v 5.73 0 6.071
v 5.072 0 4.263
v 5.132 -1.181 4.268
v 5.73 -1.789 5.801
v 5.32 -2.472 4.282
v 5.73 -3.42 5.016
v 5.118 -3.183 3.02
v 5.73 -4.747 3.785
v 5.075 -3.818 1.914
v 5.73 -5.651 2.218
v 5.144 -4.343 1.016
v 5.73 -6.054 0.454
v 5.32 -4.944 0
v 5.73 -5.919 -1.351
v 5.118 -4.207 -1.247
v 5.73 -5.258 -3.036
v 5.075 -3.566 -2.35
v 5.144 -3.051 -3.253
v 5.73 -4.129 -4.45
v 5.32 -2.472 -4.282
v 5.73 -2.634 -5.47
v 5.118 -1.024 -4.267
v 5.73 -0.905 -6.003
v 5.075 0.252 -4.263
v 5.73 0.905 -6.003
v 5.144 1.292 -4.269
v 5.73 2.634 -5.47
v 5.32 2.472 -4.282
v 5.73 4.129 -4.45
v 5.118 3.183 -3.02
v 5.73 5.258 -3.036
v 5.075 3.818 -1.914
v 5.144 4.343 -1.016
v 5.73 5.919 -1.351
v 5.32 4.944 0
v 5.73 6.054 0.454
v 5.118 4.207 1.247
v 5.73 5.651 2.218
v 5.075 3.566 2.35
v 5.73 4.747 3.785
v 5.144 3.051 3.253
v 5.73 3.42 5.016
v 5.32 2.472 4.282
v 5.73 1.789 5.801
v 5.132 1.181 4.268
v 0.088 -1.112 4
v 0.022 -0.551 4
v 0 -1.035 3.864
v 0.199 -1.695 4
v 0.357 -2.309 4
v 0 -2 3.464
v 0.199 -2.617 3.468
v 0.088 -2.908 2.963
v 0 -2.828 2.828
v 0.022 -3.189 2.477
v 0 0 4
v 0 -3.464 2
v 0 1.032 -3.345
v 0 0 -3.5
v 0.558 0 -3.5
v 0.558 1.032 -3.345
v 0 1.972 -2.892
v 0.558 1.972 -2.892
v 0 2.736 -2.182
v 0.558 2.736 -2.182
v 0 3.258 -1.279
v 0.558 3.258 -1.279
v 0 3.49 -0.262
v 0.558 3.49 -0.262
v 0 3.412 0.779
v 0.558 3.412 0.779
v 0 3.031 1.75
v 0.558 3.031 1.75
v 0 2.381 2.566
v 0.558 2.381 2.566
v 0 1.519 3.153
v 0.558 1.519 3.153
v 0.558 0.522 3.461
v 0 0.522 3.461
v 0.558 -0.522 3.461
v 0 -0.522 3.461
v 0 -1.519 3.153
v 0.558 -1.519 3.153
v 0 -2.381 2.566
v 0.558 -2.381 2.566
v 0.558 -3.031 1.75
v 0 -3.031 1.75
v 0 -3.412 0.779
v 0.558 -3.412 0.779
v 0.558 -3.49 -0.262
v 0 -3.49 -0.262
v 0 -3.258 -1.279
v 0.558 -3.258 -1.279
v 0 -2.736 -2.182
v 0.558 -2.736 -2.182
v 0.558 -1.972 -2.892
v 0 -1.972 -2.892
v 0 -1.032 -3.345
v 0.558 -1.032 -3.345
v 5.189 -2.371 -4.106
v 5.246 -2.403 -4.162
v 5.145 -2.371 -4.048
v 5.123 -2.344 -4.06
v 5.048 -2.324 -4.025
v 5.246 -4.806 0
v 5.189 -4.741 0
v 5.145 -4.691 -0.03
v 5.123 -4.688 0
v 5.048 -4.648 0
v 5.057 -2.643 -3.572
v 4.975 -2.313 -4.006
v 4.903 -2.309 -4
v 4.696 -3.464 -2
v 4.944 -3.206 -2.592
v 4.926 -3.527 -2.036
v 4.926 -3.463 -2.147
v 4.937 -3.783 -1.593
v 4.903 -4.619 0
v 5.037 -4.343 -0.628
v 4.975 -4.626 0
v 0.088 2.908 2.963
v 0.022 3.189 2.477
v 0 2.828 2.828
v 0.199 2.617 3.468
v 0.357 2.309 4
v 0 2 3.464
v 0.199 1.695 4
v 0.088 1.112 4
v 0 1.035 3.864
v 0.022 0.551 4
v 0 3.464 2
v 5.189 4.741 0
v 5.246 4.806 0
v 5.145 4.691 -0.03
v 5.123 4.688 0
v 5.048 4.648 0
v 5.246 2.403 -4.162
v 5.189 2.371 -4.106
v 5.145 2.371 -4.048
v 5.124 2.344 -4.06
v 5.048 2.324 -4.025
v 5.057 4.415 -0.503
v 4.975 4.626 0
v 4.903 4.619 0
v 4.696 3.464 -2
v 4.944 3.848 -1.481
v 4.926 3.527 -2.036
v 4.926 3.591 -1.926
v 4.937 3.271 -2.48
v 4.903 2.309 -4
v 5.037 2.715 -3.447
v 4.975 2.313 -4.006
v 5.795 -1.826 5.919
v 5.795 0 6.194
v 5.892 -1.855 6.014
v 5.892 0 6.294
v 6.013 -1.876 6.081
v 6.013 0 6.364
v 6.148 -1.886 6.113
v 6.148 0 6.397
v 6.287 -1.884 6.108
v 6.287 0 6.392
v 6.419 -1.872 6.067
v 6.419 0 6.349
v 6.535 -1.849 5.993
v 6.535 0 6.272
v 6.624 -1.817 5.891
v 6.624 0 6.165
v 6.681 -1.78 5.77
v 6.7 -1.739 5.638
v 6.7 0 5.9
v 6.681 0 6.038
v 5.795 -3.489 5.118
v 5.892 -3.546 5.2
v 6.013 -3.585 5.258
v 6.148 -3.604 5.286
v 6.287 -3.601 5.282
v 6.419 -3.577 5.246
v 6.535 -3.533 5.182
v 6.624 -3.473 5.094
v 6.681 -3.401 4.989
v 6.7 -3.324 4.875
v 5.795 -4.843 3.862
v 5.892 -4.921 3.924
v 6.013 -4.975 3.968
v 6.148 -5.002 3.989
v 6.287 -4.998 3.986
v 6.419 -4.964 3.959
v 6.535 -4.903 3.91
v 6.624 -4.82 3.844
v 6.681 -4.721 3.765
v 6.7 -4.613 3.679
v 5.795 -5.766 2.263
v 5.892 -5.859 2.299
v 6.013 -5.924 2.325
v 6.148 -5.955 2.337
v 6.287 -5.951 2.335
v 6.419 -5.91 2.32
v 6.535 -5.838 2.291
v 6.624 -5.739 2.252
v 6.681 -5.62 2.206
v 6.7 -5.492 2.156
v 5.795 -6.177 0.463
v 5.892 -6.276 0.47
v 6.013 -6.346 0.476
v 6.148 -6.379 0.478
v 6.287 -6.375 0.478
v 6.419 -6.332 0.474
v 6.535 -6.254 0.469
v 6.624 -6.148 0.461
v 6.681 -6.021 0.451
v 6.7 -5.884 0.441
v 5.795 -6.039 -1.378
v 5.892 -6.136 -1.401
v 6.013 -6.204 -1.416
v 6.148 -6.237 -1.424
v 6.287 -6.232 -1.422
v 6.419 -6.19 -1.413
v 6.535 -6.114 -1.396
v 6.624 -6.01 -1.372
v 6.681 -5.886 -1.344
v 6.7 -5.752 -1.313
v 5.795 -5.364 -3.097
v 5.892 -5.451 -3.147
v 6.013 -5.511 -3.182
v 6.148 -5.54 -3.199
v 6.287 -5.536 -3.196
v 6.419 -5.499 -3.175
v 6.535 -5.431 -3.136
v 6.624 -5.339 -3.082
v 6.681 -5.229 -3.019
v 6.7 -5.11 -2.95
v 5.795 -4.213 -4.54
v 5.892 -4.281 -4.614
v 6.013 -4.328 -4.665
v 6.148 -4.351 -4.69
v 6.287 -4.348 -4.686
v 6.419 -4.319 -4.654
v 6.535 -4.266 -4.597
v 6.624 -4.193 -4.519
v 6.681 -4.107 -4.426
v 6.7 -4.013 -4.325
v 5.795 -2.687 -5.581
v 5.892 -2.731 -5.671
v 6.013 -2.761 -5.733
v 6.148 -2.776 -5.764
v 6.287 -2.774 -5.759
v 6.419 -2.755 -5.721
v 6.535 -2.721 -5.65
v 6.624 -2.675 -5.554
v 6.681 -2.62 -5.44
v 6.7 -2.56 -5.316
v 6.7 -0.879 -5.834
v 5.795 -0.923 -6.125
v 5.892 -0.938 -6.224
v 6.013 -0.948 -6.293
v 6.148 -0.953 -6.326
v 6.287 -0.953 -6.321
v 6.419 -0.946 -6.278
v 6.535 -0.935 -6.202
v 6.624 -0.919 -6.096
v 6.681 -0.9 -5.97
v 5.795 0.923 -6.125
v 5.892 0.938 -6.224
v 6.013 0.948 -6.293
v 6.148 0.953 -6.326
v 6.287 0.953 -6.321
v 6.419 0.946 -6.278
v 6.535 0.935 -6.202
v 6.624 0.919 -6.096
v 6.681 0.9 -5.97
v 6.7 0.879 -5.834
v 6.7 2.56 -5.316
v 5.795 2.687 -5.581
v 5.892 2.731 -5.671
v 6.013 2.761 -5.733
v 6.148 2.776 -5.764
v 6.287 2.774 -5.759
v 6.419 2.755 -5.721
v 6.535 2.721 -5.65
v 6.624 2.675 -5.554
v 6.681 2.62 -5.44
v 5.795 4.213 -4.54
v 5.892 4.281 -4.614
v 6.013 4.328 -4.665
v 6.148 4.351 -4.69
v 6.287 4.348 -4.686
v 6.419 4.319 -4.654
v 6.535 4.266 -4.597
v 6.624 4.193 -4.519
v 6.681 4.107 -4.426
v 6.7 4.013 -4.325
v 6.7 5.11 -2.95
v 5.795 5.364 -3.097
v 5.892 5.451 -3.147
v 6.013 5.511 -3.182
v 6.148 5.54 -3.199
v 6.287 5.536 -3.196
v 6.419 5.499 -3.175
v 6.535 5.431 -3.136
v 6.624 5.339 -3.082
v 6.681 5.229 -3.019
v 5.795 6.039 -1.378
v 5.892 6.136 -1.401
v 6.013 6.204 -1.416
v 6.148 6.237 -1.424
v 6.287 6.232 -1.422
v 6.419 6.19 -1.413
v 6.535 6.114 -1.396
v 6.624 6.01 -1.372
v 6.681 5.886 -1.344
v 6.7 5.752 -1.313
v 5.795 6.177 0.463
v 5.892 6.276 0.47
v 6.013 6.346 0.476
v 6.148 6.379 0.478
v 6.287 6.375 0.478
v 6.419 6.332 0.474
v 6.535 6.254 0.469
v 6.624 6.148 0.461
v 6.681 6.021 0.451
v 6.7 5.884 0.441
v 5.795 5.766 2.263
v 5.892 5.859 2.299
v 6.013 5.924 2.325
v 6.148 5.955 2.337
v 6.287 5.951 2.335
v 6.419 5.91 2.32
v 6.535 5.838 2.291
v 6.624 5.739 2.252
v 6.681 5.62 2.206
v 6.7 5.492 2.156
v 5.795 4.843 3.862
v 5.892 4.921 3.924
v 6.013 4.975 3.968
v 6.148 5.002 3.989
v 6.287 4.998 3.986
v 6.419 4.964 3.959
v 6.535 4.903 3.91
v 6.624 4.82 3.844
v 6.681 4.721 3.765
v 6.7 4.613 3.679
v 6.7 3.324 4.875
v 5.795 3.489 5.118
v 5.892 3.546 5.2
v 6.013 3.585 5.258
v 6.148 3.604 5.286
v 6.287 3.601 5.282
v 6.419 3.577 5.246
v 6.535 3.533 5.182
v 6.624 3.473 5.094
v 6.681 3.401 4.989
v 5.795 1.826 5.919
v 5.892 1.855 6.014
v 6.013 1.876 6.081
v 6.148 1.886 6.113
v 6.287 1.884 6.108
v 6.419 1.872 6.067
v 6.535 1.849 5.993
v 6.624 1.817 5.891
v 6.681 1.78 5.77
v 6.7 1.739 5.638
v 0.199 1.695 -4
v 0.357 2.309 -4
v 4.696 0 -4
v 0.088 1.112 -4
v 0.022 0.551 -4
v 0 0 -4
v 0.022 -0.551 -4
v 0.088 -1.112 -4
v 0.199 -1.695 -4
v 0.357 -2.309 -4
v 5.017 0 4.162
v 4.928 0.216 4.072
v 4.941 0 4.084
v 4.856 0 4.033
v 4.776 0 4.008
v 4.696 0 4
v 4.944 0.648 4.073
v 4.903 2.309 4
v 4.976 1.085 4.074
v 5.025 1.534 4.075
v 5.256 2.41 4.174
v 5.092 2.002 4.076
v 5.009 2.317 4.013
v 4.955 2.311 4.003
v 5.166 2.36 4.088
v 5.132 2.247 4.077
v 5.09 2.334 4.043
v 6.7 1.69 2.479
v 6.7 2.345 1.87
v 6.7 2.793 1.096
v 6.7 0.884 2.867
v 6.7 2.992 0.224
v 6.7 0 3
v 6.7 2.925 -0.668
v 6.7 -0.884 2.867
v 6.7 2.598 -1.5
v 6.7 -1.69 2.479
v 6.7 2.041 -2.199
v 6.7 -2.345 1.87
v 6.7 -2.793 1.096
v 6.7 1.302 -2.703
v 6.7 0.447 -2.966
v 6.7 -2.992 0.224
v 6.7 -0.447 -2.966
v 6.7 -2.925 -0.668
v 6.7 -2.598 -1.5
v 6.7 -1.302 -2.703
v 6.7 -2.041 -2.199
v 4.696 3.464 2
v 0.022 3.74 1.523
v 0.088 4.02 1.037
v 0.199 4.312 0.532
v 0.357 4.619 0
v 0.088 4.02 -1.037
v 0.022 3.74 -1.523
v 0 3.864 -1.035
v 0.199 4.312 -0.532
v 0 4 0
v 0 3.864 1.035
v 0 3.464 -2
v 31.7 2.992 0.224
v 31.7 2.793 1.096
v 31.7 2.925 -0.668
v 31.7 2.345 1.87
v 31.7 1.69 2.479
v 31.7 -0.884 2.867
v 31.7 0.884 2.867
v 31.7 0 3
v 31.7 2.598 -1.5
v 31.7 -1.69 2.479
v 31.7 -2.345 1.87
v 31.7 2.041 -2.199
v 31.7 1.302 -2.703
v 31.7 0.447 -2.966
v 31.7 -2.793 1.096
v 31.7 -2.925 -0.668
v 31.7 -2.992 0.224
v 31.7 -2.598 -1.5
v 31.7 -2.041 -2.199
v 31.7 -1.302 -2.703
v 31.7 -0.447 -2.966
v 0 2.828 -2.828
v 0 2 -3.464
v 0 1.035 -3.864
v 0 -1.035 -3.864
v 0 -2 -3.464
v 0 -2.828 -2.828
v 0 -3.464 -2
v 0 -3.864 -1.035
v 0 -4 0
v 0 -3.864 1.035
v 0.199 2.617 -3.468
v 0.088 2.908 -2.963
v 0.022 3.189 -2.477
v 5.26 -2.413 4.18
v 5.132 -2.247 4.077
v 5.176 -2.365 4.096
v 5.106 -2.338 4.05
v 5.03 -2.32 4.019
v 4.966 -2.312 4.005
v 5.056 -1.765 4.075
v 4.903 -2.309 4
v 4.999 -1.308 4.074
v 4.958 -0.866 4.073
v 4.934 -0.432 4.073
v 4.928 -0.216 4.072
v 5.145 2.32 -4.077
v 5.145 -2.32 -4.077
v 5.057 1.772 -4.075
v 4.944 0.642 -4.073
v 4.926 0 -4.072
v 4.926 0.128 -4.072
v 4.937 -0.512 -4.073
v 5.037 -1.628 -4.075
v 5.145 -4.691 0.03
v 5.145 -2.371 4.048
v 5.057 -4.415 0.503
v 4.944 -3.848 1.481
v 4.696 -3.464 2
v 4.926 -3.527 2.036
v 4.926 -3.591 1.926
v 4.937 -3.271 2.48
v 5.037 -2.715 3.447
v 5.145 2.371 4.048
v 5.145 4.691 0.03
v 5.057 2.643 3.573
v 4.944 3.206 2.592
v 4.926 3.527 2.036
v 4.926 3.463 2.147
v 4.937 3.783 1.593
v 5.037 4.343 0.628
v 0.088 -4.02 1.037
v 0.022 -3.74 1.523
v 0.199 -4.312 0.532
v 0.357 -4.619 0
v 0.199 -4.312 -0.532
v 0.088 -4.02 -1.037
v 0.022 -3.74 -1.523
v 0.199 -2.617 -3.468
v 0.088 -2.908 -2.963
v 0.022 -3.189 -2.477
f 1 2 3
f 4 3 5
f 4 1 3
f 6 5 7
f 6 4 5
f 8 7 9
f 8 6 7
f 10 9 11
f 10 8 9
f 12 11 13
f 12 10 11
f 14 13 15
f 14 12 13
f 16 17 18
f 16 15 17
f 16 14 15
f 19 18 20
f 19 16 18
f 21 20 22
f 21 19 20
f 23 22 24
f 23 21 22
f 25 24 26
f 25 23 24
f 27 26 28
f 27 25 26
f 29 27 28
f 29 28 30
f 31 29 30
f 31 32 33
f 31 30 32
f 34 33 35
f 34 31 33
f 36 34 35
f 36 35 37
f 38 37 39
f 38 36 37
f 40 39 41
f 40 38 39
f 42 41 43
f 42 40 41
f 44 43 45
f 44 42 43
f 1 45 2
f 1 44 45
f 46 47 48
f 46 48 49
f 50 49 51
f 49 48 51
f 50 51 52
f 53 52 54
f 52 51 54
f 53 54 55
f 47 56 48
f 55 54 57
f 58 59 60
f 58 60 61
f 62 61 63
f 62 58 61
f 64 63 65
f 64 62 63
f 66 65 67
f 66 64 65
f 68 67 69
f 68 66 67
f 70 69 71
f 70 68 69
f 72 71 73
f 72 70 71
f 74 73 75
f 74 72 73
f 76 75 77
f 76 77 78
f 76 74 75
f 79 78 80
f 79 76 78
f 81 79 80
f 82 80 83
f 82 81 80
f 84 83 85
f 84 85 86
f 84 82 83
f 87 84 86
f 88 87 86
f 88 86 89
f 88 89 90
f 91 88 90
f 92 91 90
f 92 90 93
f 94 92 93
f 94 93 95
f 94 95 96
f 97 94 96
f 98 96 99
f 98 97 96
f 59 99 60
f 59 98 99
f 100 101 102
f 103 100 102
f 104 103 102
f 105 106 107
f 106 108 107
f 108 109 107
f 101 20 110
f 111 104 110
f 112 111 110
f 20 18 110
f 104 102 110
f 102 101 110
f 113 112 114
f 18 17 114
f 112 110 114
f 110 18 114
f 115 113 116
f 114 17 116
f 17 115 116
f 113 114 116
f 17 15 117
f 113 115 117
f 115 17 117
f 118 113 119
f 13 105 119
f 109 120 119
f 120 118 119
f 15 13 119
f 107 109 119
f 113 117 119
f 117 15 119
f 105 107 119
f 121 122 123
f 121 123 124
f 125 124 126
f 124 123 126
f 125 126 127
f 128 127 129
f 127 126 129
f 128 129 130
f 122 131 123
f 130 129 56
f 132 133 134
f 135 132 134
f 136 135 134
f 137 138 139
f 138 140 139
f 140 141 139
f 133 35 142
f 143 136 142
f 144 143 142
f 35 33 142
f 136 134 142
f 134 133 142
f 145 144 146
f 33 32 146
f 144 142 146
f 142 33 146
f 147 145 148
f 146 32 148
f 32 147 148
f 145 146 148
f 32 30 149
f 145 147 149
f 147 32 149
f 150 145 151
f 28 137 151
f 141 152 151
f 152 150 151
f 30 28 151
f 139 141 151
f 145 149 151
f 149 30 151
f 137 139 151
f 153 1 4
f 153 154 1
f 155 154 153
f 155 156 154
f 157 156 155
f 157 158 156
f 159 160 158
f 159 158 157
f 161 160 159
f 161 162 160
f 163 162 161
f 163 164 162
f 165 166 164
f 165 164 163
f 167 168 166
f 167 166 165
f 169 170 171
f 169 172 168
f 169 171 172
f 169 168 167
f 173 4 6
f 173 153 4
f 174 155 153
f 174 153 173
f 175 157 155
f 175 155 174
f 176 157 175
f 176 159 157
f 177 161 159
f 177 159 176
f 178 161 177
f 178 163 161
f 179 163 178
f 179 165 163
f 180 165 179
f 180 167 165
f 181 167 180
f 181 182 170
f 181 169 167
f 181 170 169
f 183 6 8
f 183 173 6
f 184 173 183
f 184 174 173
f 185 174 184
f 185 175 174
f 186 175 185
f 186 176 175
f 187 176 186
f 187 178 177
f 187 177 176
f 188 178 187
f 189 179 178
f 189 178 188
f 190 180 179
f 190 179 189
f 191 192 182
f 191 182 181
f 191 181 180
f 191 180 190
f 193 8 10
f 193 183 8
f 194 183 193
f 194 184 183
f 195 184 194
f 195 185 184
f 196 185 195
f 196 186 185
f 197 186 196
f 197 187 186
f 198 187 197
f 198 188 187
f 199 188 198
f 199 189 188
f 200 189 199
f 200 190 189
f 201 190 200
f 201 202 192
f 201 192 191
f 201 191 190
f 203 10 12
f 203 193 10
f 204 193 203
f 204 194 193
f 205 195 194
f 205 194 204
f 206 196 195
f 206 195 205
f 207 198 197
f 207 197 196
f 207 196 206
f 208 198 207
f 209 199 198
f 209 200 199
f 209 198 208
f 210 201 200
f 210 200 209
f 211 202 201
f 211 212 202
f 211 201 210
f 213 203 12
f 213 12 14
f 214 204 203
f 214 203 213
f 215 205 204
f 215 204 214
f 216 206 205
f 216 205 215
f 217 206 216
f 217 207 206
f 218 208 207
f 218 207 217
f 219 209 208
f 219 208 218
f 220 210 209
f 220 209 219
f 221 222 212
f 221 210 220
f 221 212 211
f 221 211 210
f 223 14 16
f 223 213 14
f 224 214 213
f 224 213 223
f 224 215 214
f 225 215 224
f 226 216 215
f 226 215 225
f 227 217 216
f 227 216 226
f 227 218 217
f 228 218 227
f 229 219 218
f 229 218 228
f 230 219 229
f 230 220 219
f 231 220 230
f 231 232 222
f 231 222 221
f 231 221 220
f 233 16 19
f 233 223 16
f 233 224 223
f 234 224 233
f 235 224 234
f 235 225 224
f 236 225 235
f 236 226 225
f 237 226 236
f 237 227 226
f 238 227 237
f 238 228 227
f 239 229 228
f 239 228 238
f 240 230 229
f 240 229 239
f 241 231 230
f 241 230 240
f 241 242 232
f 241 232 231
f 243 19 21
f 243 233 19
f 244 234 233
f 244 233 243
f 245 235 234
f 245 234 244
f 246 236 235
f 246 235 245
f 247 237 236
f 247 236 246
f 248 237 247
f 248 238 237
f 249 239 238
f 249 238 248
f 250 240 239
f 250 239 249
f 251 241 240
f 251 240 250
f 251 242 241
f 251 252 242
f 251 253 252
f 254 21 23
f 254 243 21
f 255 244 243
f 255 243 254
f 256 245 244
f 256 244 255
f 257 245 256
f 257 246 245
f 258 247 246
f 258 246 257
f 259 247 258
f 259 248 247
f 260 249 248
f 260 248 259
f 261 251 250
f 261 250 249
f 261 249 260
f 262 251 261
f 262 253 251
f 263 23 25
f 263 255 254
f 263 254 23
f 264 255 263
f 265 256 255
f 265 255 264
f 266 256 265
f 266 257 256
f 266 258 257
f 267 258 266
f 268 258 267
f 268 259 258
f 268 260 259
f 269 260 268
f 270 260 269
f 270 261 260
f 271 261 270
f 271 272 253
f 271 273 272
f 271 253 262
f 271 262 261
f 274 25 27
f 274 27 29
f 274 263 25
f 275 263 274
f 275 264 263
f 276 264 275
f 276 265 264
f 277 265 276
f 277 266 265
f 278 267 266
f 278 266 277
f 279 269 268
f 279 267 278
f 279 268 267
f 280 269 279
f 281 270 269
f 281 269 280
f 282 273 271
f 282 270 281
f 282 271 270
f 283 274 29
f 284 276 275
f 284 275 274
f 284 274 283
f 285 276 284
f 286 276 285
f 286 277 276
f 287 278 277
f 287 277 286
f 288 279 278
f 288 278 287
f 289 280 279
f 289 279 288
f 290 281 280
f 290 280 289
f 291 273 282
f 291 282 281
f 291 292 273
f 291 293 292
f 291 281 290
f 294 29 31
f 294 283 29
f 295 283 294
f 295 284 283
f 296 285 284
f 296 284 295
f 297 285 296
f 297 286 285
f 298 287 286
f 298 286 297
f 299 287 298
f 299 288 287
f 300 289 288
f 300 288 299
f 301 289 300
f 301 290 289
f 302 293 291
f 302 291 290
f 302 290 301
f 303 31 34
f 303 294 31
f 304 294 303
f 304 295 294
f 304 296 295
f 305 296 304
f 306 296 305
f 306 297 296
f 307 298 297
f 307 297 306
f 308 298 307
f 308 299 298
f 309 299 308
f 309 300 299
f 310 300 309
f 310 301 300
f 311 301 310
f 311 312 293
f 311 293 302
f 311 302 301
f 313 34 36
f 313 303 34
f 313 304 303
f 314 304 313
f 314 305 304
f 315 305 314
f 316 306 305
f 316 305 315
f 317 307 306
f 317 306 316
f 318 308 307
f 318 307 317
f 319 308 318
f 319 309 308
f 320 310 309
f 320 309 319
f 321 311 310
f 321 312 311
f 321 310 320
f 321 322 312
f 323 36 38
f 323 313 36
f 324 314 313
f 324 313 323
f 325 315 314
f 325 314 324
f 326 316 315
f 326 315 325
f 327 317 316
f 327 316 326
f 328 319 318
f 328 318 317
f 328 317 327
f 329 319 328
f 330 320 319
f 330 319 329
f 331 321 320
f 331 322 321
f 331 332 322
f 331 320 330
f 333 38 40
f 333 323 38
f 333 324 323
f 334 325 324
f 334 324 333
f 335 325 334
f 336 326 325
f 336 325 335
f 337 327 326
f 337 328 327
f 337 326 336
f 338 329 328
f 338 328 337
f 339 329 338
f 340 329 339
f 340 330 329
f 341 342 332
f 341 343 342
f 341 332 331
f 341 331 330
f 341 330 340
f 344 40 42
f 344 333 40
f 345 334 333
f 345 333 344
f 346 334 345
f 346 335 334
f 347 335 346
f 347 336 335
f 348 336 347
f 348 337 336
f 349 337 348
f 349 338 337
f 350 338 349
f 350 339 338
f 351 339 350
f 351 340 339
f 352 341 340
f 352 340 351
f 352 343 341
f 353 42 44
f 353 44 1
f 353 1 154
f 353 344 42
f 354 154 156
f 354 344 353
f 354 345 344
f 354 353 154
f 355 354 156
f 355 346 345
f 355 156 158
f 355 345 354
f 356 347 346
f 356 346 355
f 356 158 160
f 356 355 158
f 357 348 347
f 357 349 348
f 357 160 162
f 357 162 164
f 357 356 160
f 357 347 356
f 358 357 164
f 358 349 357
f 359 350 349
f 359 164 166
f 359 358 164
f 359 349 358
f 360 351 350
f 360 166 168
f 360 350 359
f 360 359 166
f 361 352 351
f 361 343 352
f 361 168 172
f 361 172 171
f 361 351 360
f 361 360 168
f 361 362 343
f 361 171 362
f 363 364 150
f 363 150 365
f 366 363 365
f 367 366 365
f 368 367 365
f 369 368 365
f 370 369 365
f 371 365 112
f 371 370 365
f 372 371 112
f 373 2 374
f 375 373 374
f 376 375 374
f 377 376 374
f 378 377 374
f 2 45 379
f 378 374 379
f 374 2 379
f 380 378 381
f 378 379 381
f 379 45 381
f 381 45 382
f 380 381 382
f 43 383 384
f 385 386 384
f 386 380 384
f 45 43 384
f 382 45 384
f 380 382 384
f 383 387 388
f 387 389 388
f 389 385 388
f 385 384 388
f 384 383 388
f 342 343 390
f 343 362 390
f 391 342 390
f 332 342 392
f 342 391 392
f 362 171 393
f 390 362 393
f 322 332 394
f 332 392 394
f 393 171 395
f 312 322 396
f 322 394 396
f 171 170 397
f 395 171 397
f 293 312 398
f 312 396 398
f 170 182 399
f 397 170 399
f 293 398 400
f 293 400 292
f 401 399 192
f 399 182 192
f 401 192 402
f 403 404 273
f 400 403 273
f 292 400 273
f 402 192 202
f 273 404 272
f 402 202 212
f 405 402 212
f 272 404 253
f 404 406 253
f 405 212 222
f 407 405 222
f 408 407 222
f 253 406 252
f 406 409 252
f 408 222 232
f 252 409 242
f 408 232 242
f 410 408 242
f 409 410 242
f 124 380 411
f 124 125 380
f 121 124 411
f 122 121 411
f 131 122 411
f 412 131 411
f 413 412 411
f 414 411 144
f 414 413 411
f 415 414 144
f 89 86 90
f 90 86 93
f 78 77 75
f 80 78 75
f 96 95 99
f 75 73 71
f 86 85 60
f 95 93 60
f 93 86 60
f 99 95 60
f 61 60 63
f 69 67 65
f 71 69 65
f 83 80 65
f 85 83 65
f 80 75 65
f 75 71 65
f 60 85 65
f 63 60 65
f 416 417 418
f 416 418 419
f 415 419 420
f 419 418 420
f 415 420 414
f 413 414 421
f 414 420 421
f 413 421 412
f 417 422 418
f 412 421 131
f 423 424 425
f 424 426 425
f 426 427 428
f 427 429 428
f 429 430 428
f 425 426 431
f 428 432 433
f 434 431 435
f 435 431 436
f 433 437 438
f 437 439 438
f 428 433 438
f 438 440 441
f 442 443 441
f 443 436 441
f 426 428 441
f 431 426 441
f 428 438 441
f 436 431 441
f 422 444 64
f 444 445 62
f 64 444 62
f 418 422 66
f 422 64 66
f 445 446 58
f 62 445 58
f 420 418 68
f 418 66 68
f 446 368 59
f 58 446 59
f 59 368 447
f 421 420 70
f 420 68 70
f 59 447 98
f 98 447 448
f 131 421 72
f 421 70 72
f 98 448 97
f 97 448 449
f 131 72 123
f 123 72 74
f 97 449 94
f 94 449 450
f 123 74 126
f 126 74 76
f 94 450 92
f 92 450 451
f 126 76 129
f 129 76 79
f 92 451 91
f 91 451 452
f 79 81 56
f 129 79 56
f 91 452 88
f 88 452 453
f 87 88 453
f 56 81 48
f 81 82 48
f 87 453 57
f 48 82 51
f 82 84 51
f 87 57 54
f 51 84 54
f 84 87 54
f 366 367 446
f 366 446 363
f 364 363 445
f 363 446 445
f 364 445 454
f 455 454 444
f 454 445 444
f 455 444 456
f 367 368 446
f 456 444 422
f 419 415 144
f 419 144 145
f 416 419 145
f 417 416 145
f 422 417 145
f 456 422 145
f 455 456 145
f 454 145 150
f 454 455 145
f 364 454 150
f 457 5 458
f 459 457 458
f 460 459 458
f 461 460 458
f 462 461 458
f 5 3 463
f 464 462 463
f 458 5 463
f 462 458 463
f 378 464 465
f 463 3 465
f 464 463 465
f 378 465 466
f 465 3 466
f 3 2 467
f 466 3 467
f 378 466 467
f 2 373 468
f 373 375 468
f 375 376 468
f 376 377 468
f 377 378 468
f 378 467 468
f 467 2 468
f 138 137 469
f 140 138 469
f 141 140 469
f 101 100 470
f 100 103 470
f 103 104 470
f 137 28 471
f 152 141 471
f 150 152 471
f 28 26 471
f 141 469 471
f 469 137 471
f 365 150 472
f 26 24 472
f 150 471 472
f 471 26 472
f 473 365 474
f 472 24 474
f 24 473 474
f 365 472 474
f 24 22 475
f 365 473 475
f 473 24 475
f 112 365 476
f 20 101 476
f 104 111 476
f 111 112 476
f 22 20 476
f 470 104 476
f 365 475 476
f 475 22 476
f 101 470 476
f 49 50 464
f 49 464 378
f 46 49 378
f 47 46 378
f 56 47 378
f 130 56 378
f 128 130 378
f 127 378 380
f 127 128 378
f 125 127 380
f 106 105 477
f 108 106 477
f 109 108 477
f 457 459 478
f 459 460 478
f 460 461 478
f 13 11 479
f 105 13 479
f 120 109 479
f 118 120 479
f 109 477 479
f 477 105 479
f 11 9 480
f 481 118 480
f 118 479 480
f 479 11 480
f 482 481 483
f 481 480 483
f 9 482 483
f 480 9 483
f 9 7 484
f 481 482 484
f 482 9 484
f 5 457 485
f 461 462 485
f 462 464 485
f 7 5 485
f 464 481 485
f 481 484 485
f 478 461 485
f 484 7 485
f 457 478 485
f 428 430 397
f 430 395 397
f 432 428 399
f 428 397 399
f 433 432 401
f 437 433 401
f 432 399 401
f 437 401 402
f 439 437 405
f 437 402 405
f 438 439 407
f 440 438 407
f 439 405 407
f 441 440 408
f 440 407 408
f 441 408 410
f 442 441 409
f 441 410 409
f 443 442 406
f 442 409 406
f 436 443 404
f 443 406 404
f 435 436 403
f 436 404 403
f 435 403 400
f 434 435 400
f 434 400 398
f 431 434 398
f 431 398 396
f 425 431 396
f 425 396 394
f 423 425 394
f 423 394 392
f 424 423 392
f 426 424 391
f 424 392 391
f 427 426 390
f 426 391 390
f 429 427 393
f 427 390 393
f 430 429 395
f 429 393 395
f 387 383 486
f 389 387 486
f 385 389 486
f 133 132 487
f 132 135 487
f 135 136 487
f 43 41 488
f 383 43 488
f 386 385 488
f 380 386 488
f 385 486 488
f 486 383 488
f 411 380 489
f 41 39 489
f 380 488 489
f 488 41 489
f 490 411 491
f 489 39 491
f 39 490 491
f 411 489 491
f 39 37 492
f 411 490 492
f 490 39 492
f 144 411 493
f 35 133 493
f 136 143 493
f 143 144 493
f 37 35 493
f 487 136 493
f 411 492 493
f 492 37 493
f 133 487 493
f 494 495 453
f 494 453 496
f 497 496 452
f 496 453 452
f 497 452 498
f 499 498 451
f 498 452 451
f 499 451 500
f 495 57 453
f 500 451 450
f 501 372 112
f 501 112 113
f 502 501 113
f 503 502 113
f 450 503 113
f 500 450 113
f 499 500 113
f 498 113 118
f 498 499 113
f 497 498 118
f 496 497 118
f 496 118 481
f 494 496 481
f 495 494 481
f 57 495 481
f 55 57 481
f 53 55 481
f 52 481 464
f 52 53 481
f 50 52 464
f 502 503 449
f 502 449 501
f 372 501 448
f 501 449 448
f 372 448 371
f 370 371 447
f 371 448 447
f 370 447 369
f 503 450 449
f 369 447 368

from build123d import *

# Parameters (mm, degrees)
SKETCH2_R         = 4.665127021
HEX_DIE_DEPTH     = 6.7
FLANGEHEXFILLET_R = 0.4
SKETCH4_R         = 3.5
INDENT_DEPTH      = 0.558333333


with BuildPart() as part:
    # BodySke → Base-Revolve (revolve)
    with BuildSketch(Plane.XY, mode=Mode.PRIVATE) as base_revolve_sk:
        Polygon((6.7, 3), (6.7, 4.618937644), (0.357343816, 4.618937644), (0, 4), (0, 0), (31.7, 0), (31.7, 3), align=None)
    revolve(base_revolve_sk.sketch.rotate(Axis((-25.4, 0, 0), (1, 0, 0)), 90), axis=Axis((-25.4, 0, 0), (1, 0, 0)))

    # Sketch2 → Hex-Die (cut)
    with BuildSketch(Plane(origin=(0, 0, 0), x_dir=(0, 0, -1), z_dir=(1, 0, 0))):
        Circle(SKETCH2_R)
        Polygon((-4, 2.309401087), (0, 4.618802174), (4, 2.309401087), (4, -2.309401087), (0, -4.618802174), (-4, -2.309401087), align=None, mode=Mode.SUBTRACT)
    extrude(amount=HEX_DIE_DEPTH, mode=Mode.SUBTRACT)

    # Sketch5 → Flange (revolve)
    with BuildSketch(Plane.XY, mode=Mode.PRIVATE) as flange_sk:
        with BuildLine():
            Line((3.520486732, 0), (5.73015369, 6.071010072))
            ThreePointArc((5.73015369, 6.071010072), (6.286824089, 6.392403877), (6.7, 5.9))
            Line((6.7, 5.9), (6.7, 0))
            Line((6.7, 0), (3.520486732, 0))
        make_face()
    revolve(flange_sk.sketch.rotate(Axis((0, 0, 0), (1, 0, 0)), 90), axis=Axis((0, 0, 0), (1, 0, 0)))

    # FlangeHexFillet
    flangehexfillet_edges = [part.edges().sort_by_distance(p)[0] for p in [
        (5.036325168, 1.159737723, 4),
        (4.976367673, 3.46410163, 2),
        (4.976367673, 3.46410163, -2),
        (4.976367669, 0, -4),
        (4.976367673, -3.46410163, -2),
        (4.976367673, -3.46410163, 2),
        (5.036325168, -1.159737723, 4),
    ]]
    fillet(flangehexfillet_edges, radius=FLANGEHEXFILLET_R)

    # Sketch4 → Indent (cut)
    with BuildSketch(Plane(origin=(0, 0, 0), x_dir=(0, 0, -1), z_dir=(1, 0, 0))):
        Circle(SKETCH4_R)
    extrude(amount=INDENT_DEPTH, mode=Mode.SUBTRACT)


solid = part.part
